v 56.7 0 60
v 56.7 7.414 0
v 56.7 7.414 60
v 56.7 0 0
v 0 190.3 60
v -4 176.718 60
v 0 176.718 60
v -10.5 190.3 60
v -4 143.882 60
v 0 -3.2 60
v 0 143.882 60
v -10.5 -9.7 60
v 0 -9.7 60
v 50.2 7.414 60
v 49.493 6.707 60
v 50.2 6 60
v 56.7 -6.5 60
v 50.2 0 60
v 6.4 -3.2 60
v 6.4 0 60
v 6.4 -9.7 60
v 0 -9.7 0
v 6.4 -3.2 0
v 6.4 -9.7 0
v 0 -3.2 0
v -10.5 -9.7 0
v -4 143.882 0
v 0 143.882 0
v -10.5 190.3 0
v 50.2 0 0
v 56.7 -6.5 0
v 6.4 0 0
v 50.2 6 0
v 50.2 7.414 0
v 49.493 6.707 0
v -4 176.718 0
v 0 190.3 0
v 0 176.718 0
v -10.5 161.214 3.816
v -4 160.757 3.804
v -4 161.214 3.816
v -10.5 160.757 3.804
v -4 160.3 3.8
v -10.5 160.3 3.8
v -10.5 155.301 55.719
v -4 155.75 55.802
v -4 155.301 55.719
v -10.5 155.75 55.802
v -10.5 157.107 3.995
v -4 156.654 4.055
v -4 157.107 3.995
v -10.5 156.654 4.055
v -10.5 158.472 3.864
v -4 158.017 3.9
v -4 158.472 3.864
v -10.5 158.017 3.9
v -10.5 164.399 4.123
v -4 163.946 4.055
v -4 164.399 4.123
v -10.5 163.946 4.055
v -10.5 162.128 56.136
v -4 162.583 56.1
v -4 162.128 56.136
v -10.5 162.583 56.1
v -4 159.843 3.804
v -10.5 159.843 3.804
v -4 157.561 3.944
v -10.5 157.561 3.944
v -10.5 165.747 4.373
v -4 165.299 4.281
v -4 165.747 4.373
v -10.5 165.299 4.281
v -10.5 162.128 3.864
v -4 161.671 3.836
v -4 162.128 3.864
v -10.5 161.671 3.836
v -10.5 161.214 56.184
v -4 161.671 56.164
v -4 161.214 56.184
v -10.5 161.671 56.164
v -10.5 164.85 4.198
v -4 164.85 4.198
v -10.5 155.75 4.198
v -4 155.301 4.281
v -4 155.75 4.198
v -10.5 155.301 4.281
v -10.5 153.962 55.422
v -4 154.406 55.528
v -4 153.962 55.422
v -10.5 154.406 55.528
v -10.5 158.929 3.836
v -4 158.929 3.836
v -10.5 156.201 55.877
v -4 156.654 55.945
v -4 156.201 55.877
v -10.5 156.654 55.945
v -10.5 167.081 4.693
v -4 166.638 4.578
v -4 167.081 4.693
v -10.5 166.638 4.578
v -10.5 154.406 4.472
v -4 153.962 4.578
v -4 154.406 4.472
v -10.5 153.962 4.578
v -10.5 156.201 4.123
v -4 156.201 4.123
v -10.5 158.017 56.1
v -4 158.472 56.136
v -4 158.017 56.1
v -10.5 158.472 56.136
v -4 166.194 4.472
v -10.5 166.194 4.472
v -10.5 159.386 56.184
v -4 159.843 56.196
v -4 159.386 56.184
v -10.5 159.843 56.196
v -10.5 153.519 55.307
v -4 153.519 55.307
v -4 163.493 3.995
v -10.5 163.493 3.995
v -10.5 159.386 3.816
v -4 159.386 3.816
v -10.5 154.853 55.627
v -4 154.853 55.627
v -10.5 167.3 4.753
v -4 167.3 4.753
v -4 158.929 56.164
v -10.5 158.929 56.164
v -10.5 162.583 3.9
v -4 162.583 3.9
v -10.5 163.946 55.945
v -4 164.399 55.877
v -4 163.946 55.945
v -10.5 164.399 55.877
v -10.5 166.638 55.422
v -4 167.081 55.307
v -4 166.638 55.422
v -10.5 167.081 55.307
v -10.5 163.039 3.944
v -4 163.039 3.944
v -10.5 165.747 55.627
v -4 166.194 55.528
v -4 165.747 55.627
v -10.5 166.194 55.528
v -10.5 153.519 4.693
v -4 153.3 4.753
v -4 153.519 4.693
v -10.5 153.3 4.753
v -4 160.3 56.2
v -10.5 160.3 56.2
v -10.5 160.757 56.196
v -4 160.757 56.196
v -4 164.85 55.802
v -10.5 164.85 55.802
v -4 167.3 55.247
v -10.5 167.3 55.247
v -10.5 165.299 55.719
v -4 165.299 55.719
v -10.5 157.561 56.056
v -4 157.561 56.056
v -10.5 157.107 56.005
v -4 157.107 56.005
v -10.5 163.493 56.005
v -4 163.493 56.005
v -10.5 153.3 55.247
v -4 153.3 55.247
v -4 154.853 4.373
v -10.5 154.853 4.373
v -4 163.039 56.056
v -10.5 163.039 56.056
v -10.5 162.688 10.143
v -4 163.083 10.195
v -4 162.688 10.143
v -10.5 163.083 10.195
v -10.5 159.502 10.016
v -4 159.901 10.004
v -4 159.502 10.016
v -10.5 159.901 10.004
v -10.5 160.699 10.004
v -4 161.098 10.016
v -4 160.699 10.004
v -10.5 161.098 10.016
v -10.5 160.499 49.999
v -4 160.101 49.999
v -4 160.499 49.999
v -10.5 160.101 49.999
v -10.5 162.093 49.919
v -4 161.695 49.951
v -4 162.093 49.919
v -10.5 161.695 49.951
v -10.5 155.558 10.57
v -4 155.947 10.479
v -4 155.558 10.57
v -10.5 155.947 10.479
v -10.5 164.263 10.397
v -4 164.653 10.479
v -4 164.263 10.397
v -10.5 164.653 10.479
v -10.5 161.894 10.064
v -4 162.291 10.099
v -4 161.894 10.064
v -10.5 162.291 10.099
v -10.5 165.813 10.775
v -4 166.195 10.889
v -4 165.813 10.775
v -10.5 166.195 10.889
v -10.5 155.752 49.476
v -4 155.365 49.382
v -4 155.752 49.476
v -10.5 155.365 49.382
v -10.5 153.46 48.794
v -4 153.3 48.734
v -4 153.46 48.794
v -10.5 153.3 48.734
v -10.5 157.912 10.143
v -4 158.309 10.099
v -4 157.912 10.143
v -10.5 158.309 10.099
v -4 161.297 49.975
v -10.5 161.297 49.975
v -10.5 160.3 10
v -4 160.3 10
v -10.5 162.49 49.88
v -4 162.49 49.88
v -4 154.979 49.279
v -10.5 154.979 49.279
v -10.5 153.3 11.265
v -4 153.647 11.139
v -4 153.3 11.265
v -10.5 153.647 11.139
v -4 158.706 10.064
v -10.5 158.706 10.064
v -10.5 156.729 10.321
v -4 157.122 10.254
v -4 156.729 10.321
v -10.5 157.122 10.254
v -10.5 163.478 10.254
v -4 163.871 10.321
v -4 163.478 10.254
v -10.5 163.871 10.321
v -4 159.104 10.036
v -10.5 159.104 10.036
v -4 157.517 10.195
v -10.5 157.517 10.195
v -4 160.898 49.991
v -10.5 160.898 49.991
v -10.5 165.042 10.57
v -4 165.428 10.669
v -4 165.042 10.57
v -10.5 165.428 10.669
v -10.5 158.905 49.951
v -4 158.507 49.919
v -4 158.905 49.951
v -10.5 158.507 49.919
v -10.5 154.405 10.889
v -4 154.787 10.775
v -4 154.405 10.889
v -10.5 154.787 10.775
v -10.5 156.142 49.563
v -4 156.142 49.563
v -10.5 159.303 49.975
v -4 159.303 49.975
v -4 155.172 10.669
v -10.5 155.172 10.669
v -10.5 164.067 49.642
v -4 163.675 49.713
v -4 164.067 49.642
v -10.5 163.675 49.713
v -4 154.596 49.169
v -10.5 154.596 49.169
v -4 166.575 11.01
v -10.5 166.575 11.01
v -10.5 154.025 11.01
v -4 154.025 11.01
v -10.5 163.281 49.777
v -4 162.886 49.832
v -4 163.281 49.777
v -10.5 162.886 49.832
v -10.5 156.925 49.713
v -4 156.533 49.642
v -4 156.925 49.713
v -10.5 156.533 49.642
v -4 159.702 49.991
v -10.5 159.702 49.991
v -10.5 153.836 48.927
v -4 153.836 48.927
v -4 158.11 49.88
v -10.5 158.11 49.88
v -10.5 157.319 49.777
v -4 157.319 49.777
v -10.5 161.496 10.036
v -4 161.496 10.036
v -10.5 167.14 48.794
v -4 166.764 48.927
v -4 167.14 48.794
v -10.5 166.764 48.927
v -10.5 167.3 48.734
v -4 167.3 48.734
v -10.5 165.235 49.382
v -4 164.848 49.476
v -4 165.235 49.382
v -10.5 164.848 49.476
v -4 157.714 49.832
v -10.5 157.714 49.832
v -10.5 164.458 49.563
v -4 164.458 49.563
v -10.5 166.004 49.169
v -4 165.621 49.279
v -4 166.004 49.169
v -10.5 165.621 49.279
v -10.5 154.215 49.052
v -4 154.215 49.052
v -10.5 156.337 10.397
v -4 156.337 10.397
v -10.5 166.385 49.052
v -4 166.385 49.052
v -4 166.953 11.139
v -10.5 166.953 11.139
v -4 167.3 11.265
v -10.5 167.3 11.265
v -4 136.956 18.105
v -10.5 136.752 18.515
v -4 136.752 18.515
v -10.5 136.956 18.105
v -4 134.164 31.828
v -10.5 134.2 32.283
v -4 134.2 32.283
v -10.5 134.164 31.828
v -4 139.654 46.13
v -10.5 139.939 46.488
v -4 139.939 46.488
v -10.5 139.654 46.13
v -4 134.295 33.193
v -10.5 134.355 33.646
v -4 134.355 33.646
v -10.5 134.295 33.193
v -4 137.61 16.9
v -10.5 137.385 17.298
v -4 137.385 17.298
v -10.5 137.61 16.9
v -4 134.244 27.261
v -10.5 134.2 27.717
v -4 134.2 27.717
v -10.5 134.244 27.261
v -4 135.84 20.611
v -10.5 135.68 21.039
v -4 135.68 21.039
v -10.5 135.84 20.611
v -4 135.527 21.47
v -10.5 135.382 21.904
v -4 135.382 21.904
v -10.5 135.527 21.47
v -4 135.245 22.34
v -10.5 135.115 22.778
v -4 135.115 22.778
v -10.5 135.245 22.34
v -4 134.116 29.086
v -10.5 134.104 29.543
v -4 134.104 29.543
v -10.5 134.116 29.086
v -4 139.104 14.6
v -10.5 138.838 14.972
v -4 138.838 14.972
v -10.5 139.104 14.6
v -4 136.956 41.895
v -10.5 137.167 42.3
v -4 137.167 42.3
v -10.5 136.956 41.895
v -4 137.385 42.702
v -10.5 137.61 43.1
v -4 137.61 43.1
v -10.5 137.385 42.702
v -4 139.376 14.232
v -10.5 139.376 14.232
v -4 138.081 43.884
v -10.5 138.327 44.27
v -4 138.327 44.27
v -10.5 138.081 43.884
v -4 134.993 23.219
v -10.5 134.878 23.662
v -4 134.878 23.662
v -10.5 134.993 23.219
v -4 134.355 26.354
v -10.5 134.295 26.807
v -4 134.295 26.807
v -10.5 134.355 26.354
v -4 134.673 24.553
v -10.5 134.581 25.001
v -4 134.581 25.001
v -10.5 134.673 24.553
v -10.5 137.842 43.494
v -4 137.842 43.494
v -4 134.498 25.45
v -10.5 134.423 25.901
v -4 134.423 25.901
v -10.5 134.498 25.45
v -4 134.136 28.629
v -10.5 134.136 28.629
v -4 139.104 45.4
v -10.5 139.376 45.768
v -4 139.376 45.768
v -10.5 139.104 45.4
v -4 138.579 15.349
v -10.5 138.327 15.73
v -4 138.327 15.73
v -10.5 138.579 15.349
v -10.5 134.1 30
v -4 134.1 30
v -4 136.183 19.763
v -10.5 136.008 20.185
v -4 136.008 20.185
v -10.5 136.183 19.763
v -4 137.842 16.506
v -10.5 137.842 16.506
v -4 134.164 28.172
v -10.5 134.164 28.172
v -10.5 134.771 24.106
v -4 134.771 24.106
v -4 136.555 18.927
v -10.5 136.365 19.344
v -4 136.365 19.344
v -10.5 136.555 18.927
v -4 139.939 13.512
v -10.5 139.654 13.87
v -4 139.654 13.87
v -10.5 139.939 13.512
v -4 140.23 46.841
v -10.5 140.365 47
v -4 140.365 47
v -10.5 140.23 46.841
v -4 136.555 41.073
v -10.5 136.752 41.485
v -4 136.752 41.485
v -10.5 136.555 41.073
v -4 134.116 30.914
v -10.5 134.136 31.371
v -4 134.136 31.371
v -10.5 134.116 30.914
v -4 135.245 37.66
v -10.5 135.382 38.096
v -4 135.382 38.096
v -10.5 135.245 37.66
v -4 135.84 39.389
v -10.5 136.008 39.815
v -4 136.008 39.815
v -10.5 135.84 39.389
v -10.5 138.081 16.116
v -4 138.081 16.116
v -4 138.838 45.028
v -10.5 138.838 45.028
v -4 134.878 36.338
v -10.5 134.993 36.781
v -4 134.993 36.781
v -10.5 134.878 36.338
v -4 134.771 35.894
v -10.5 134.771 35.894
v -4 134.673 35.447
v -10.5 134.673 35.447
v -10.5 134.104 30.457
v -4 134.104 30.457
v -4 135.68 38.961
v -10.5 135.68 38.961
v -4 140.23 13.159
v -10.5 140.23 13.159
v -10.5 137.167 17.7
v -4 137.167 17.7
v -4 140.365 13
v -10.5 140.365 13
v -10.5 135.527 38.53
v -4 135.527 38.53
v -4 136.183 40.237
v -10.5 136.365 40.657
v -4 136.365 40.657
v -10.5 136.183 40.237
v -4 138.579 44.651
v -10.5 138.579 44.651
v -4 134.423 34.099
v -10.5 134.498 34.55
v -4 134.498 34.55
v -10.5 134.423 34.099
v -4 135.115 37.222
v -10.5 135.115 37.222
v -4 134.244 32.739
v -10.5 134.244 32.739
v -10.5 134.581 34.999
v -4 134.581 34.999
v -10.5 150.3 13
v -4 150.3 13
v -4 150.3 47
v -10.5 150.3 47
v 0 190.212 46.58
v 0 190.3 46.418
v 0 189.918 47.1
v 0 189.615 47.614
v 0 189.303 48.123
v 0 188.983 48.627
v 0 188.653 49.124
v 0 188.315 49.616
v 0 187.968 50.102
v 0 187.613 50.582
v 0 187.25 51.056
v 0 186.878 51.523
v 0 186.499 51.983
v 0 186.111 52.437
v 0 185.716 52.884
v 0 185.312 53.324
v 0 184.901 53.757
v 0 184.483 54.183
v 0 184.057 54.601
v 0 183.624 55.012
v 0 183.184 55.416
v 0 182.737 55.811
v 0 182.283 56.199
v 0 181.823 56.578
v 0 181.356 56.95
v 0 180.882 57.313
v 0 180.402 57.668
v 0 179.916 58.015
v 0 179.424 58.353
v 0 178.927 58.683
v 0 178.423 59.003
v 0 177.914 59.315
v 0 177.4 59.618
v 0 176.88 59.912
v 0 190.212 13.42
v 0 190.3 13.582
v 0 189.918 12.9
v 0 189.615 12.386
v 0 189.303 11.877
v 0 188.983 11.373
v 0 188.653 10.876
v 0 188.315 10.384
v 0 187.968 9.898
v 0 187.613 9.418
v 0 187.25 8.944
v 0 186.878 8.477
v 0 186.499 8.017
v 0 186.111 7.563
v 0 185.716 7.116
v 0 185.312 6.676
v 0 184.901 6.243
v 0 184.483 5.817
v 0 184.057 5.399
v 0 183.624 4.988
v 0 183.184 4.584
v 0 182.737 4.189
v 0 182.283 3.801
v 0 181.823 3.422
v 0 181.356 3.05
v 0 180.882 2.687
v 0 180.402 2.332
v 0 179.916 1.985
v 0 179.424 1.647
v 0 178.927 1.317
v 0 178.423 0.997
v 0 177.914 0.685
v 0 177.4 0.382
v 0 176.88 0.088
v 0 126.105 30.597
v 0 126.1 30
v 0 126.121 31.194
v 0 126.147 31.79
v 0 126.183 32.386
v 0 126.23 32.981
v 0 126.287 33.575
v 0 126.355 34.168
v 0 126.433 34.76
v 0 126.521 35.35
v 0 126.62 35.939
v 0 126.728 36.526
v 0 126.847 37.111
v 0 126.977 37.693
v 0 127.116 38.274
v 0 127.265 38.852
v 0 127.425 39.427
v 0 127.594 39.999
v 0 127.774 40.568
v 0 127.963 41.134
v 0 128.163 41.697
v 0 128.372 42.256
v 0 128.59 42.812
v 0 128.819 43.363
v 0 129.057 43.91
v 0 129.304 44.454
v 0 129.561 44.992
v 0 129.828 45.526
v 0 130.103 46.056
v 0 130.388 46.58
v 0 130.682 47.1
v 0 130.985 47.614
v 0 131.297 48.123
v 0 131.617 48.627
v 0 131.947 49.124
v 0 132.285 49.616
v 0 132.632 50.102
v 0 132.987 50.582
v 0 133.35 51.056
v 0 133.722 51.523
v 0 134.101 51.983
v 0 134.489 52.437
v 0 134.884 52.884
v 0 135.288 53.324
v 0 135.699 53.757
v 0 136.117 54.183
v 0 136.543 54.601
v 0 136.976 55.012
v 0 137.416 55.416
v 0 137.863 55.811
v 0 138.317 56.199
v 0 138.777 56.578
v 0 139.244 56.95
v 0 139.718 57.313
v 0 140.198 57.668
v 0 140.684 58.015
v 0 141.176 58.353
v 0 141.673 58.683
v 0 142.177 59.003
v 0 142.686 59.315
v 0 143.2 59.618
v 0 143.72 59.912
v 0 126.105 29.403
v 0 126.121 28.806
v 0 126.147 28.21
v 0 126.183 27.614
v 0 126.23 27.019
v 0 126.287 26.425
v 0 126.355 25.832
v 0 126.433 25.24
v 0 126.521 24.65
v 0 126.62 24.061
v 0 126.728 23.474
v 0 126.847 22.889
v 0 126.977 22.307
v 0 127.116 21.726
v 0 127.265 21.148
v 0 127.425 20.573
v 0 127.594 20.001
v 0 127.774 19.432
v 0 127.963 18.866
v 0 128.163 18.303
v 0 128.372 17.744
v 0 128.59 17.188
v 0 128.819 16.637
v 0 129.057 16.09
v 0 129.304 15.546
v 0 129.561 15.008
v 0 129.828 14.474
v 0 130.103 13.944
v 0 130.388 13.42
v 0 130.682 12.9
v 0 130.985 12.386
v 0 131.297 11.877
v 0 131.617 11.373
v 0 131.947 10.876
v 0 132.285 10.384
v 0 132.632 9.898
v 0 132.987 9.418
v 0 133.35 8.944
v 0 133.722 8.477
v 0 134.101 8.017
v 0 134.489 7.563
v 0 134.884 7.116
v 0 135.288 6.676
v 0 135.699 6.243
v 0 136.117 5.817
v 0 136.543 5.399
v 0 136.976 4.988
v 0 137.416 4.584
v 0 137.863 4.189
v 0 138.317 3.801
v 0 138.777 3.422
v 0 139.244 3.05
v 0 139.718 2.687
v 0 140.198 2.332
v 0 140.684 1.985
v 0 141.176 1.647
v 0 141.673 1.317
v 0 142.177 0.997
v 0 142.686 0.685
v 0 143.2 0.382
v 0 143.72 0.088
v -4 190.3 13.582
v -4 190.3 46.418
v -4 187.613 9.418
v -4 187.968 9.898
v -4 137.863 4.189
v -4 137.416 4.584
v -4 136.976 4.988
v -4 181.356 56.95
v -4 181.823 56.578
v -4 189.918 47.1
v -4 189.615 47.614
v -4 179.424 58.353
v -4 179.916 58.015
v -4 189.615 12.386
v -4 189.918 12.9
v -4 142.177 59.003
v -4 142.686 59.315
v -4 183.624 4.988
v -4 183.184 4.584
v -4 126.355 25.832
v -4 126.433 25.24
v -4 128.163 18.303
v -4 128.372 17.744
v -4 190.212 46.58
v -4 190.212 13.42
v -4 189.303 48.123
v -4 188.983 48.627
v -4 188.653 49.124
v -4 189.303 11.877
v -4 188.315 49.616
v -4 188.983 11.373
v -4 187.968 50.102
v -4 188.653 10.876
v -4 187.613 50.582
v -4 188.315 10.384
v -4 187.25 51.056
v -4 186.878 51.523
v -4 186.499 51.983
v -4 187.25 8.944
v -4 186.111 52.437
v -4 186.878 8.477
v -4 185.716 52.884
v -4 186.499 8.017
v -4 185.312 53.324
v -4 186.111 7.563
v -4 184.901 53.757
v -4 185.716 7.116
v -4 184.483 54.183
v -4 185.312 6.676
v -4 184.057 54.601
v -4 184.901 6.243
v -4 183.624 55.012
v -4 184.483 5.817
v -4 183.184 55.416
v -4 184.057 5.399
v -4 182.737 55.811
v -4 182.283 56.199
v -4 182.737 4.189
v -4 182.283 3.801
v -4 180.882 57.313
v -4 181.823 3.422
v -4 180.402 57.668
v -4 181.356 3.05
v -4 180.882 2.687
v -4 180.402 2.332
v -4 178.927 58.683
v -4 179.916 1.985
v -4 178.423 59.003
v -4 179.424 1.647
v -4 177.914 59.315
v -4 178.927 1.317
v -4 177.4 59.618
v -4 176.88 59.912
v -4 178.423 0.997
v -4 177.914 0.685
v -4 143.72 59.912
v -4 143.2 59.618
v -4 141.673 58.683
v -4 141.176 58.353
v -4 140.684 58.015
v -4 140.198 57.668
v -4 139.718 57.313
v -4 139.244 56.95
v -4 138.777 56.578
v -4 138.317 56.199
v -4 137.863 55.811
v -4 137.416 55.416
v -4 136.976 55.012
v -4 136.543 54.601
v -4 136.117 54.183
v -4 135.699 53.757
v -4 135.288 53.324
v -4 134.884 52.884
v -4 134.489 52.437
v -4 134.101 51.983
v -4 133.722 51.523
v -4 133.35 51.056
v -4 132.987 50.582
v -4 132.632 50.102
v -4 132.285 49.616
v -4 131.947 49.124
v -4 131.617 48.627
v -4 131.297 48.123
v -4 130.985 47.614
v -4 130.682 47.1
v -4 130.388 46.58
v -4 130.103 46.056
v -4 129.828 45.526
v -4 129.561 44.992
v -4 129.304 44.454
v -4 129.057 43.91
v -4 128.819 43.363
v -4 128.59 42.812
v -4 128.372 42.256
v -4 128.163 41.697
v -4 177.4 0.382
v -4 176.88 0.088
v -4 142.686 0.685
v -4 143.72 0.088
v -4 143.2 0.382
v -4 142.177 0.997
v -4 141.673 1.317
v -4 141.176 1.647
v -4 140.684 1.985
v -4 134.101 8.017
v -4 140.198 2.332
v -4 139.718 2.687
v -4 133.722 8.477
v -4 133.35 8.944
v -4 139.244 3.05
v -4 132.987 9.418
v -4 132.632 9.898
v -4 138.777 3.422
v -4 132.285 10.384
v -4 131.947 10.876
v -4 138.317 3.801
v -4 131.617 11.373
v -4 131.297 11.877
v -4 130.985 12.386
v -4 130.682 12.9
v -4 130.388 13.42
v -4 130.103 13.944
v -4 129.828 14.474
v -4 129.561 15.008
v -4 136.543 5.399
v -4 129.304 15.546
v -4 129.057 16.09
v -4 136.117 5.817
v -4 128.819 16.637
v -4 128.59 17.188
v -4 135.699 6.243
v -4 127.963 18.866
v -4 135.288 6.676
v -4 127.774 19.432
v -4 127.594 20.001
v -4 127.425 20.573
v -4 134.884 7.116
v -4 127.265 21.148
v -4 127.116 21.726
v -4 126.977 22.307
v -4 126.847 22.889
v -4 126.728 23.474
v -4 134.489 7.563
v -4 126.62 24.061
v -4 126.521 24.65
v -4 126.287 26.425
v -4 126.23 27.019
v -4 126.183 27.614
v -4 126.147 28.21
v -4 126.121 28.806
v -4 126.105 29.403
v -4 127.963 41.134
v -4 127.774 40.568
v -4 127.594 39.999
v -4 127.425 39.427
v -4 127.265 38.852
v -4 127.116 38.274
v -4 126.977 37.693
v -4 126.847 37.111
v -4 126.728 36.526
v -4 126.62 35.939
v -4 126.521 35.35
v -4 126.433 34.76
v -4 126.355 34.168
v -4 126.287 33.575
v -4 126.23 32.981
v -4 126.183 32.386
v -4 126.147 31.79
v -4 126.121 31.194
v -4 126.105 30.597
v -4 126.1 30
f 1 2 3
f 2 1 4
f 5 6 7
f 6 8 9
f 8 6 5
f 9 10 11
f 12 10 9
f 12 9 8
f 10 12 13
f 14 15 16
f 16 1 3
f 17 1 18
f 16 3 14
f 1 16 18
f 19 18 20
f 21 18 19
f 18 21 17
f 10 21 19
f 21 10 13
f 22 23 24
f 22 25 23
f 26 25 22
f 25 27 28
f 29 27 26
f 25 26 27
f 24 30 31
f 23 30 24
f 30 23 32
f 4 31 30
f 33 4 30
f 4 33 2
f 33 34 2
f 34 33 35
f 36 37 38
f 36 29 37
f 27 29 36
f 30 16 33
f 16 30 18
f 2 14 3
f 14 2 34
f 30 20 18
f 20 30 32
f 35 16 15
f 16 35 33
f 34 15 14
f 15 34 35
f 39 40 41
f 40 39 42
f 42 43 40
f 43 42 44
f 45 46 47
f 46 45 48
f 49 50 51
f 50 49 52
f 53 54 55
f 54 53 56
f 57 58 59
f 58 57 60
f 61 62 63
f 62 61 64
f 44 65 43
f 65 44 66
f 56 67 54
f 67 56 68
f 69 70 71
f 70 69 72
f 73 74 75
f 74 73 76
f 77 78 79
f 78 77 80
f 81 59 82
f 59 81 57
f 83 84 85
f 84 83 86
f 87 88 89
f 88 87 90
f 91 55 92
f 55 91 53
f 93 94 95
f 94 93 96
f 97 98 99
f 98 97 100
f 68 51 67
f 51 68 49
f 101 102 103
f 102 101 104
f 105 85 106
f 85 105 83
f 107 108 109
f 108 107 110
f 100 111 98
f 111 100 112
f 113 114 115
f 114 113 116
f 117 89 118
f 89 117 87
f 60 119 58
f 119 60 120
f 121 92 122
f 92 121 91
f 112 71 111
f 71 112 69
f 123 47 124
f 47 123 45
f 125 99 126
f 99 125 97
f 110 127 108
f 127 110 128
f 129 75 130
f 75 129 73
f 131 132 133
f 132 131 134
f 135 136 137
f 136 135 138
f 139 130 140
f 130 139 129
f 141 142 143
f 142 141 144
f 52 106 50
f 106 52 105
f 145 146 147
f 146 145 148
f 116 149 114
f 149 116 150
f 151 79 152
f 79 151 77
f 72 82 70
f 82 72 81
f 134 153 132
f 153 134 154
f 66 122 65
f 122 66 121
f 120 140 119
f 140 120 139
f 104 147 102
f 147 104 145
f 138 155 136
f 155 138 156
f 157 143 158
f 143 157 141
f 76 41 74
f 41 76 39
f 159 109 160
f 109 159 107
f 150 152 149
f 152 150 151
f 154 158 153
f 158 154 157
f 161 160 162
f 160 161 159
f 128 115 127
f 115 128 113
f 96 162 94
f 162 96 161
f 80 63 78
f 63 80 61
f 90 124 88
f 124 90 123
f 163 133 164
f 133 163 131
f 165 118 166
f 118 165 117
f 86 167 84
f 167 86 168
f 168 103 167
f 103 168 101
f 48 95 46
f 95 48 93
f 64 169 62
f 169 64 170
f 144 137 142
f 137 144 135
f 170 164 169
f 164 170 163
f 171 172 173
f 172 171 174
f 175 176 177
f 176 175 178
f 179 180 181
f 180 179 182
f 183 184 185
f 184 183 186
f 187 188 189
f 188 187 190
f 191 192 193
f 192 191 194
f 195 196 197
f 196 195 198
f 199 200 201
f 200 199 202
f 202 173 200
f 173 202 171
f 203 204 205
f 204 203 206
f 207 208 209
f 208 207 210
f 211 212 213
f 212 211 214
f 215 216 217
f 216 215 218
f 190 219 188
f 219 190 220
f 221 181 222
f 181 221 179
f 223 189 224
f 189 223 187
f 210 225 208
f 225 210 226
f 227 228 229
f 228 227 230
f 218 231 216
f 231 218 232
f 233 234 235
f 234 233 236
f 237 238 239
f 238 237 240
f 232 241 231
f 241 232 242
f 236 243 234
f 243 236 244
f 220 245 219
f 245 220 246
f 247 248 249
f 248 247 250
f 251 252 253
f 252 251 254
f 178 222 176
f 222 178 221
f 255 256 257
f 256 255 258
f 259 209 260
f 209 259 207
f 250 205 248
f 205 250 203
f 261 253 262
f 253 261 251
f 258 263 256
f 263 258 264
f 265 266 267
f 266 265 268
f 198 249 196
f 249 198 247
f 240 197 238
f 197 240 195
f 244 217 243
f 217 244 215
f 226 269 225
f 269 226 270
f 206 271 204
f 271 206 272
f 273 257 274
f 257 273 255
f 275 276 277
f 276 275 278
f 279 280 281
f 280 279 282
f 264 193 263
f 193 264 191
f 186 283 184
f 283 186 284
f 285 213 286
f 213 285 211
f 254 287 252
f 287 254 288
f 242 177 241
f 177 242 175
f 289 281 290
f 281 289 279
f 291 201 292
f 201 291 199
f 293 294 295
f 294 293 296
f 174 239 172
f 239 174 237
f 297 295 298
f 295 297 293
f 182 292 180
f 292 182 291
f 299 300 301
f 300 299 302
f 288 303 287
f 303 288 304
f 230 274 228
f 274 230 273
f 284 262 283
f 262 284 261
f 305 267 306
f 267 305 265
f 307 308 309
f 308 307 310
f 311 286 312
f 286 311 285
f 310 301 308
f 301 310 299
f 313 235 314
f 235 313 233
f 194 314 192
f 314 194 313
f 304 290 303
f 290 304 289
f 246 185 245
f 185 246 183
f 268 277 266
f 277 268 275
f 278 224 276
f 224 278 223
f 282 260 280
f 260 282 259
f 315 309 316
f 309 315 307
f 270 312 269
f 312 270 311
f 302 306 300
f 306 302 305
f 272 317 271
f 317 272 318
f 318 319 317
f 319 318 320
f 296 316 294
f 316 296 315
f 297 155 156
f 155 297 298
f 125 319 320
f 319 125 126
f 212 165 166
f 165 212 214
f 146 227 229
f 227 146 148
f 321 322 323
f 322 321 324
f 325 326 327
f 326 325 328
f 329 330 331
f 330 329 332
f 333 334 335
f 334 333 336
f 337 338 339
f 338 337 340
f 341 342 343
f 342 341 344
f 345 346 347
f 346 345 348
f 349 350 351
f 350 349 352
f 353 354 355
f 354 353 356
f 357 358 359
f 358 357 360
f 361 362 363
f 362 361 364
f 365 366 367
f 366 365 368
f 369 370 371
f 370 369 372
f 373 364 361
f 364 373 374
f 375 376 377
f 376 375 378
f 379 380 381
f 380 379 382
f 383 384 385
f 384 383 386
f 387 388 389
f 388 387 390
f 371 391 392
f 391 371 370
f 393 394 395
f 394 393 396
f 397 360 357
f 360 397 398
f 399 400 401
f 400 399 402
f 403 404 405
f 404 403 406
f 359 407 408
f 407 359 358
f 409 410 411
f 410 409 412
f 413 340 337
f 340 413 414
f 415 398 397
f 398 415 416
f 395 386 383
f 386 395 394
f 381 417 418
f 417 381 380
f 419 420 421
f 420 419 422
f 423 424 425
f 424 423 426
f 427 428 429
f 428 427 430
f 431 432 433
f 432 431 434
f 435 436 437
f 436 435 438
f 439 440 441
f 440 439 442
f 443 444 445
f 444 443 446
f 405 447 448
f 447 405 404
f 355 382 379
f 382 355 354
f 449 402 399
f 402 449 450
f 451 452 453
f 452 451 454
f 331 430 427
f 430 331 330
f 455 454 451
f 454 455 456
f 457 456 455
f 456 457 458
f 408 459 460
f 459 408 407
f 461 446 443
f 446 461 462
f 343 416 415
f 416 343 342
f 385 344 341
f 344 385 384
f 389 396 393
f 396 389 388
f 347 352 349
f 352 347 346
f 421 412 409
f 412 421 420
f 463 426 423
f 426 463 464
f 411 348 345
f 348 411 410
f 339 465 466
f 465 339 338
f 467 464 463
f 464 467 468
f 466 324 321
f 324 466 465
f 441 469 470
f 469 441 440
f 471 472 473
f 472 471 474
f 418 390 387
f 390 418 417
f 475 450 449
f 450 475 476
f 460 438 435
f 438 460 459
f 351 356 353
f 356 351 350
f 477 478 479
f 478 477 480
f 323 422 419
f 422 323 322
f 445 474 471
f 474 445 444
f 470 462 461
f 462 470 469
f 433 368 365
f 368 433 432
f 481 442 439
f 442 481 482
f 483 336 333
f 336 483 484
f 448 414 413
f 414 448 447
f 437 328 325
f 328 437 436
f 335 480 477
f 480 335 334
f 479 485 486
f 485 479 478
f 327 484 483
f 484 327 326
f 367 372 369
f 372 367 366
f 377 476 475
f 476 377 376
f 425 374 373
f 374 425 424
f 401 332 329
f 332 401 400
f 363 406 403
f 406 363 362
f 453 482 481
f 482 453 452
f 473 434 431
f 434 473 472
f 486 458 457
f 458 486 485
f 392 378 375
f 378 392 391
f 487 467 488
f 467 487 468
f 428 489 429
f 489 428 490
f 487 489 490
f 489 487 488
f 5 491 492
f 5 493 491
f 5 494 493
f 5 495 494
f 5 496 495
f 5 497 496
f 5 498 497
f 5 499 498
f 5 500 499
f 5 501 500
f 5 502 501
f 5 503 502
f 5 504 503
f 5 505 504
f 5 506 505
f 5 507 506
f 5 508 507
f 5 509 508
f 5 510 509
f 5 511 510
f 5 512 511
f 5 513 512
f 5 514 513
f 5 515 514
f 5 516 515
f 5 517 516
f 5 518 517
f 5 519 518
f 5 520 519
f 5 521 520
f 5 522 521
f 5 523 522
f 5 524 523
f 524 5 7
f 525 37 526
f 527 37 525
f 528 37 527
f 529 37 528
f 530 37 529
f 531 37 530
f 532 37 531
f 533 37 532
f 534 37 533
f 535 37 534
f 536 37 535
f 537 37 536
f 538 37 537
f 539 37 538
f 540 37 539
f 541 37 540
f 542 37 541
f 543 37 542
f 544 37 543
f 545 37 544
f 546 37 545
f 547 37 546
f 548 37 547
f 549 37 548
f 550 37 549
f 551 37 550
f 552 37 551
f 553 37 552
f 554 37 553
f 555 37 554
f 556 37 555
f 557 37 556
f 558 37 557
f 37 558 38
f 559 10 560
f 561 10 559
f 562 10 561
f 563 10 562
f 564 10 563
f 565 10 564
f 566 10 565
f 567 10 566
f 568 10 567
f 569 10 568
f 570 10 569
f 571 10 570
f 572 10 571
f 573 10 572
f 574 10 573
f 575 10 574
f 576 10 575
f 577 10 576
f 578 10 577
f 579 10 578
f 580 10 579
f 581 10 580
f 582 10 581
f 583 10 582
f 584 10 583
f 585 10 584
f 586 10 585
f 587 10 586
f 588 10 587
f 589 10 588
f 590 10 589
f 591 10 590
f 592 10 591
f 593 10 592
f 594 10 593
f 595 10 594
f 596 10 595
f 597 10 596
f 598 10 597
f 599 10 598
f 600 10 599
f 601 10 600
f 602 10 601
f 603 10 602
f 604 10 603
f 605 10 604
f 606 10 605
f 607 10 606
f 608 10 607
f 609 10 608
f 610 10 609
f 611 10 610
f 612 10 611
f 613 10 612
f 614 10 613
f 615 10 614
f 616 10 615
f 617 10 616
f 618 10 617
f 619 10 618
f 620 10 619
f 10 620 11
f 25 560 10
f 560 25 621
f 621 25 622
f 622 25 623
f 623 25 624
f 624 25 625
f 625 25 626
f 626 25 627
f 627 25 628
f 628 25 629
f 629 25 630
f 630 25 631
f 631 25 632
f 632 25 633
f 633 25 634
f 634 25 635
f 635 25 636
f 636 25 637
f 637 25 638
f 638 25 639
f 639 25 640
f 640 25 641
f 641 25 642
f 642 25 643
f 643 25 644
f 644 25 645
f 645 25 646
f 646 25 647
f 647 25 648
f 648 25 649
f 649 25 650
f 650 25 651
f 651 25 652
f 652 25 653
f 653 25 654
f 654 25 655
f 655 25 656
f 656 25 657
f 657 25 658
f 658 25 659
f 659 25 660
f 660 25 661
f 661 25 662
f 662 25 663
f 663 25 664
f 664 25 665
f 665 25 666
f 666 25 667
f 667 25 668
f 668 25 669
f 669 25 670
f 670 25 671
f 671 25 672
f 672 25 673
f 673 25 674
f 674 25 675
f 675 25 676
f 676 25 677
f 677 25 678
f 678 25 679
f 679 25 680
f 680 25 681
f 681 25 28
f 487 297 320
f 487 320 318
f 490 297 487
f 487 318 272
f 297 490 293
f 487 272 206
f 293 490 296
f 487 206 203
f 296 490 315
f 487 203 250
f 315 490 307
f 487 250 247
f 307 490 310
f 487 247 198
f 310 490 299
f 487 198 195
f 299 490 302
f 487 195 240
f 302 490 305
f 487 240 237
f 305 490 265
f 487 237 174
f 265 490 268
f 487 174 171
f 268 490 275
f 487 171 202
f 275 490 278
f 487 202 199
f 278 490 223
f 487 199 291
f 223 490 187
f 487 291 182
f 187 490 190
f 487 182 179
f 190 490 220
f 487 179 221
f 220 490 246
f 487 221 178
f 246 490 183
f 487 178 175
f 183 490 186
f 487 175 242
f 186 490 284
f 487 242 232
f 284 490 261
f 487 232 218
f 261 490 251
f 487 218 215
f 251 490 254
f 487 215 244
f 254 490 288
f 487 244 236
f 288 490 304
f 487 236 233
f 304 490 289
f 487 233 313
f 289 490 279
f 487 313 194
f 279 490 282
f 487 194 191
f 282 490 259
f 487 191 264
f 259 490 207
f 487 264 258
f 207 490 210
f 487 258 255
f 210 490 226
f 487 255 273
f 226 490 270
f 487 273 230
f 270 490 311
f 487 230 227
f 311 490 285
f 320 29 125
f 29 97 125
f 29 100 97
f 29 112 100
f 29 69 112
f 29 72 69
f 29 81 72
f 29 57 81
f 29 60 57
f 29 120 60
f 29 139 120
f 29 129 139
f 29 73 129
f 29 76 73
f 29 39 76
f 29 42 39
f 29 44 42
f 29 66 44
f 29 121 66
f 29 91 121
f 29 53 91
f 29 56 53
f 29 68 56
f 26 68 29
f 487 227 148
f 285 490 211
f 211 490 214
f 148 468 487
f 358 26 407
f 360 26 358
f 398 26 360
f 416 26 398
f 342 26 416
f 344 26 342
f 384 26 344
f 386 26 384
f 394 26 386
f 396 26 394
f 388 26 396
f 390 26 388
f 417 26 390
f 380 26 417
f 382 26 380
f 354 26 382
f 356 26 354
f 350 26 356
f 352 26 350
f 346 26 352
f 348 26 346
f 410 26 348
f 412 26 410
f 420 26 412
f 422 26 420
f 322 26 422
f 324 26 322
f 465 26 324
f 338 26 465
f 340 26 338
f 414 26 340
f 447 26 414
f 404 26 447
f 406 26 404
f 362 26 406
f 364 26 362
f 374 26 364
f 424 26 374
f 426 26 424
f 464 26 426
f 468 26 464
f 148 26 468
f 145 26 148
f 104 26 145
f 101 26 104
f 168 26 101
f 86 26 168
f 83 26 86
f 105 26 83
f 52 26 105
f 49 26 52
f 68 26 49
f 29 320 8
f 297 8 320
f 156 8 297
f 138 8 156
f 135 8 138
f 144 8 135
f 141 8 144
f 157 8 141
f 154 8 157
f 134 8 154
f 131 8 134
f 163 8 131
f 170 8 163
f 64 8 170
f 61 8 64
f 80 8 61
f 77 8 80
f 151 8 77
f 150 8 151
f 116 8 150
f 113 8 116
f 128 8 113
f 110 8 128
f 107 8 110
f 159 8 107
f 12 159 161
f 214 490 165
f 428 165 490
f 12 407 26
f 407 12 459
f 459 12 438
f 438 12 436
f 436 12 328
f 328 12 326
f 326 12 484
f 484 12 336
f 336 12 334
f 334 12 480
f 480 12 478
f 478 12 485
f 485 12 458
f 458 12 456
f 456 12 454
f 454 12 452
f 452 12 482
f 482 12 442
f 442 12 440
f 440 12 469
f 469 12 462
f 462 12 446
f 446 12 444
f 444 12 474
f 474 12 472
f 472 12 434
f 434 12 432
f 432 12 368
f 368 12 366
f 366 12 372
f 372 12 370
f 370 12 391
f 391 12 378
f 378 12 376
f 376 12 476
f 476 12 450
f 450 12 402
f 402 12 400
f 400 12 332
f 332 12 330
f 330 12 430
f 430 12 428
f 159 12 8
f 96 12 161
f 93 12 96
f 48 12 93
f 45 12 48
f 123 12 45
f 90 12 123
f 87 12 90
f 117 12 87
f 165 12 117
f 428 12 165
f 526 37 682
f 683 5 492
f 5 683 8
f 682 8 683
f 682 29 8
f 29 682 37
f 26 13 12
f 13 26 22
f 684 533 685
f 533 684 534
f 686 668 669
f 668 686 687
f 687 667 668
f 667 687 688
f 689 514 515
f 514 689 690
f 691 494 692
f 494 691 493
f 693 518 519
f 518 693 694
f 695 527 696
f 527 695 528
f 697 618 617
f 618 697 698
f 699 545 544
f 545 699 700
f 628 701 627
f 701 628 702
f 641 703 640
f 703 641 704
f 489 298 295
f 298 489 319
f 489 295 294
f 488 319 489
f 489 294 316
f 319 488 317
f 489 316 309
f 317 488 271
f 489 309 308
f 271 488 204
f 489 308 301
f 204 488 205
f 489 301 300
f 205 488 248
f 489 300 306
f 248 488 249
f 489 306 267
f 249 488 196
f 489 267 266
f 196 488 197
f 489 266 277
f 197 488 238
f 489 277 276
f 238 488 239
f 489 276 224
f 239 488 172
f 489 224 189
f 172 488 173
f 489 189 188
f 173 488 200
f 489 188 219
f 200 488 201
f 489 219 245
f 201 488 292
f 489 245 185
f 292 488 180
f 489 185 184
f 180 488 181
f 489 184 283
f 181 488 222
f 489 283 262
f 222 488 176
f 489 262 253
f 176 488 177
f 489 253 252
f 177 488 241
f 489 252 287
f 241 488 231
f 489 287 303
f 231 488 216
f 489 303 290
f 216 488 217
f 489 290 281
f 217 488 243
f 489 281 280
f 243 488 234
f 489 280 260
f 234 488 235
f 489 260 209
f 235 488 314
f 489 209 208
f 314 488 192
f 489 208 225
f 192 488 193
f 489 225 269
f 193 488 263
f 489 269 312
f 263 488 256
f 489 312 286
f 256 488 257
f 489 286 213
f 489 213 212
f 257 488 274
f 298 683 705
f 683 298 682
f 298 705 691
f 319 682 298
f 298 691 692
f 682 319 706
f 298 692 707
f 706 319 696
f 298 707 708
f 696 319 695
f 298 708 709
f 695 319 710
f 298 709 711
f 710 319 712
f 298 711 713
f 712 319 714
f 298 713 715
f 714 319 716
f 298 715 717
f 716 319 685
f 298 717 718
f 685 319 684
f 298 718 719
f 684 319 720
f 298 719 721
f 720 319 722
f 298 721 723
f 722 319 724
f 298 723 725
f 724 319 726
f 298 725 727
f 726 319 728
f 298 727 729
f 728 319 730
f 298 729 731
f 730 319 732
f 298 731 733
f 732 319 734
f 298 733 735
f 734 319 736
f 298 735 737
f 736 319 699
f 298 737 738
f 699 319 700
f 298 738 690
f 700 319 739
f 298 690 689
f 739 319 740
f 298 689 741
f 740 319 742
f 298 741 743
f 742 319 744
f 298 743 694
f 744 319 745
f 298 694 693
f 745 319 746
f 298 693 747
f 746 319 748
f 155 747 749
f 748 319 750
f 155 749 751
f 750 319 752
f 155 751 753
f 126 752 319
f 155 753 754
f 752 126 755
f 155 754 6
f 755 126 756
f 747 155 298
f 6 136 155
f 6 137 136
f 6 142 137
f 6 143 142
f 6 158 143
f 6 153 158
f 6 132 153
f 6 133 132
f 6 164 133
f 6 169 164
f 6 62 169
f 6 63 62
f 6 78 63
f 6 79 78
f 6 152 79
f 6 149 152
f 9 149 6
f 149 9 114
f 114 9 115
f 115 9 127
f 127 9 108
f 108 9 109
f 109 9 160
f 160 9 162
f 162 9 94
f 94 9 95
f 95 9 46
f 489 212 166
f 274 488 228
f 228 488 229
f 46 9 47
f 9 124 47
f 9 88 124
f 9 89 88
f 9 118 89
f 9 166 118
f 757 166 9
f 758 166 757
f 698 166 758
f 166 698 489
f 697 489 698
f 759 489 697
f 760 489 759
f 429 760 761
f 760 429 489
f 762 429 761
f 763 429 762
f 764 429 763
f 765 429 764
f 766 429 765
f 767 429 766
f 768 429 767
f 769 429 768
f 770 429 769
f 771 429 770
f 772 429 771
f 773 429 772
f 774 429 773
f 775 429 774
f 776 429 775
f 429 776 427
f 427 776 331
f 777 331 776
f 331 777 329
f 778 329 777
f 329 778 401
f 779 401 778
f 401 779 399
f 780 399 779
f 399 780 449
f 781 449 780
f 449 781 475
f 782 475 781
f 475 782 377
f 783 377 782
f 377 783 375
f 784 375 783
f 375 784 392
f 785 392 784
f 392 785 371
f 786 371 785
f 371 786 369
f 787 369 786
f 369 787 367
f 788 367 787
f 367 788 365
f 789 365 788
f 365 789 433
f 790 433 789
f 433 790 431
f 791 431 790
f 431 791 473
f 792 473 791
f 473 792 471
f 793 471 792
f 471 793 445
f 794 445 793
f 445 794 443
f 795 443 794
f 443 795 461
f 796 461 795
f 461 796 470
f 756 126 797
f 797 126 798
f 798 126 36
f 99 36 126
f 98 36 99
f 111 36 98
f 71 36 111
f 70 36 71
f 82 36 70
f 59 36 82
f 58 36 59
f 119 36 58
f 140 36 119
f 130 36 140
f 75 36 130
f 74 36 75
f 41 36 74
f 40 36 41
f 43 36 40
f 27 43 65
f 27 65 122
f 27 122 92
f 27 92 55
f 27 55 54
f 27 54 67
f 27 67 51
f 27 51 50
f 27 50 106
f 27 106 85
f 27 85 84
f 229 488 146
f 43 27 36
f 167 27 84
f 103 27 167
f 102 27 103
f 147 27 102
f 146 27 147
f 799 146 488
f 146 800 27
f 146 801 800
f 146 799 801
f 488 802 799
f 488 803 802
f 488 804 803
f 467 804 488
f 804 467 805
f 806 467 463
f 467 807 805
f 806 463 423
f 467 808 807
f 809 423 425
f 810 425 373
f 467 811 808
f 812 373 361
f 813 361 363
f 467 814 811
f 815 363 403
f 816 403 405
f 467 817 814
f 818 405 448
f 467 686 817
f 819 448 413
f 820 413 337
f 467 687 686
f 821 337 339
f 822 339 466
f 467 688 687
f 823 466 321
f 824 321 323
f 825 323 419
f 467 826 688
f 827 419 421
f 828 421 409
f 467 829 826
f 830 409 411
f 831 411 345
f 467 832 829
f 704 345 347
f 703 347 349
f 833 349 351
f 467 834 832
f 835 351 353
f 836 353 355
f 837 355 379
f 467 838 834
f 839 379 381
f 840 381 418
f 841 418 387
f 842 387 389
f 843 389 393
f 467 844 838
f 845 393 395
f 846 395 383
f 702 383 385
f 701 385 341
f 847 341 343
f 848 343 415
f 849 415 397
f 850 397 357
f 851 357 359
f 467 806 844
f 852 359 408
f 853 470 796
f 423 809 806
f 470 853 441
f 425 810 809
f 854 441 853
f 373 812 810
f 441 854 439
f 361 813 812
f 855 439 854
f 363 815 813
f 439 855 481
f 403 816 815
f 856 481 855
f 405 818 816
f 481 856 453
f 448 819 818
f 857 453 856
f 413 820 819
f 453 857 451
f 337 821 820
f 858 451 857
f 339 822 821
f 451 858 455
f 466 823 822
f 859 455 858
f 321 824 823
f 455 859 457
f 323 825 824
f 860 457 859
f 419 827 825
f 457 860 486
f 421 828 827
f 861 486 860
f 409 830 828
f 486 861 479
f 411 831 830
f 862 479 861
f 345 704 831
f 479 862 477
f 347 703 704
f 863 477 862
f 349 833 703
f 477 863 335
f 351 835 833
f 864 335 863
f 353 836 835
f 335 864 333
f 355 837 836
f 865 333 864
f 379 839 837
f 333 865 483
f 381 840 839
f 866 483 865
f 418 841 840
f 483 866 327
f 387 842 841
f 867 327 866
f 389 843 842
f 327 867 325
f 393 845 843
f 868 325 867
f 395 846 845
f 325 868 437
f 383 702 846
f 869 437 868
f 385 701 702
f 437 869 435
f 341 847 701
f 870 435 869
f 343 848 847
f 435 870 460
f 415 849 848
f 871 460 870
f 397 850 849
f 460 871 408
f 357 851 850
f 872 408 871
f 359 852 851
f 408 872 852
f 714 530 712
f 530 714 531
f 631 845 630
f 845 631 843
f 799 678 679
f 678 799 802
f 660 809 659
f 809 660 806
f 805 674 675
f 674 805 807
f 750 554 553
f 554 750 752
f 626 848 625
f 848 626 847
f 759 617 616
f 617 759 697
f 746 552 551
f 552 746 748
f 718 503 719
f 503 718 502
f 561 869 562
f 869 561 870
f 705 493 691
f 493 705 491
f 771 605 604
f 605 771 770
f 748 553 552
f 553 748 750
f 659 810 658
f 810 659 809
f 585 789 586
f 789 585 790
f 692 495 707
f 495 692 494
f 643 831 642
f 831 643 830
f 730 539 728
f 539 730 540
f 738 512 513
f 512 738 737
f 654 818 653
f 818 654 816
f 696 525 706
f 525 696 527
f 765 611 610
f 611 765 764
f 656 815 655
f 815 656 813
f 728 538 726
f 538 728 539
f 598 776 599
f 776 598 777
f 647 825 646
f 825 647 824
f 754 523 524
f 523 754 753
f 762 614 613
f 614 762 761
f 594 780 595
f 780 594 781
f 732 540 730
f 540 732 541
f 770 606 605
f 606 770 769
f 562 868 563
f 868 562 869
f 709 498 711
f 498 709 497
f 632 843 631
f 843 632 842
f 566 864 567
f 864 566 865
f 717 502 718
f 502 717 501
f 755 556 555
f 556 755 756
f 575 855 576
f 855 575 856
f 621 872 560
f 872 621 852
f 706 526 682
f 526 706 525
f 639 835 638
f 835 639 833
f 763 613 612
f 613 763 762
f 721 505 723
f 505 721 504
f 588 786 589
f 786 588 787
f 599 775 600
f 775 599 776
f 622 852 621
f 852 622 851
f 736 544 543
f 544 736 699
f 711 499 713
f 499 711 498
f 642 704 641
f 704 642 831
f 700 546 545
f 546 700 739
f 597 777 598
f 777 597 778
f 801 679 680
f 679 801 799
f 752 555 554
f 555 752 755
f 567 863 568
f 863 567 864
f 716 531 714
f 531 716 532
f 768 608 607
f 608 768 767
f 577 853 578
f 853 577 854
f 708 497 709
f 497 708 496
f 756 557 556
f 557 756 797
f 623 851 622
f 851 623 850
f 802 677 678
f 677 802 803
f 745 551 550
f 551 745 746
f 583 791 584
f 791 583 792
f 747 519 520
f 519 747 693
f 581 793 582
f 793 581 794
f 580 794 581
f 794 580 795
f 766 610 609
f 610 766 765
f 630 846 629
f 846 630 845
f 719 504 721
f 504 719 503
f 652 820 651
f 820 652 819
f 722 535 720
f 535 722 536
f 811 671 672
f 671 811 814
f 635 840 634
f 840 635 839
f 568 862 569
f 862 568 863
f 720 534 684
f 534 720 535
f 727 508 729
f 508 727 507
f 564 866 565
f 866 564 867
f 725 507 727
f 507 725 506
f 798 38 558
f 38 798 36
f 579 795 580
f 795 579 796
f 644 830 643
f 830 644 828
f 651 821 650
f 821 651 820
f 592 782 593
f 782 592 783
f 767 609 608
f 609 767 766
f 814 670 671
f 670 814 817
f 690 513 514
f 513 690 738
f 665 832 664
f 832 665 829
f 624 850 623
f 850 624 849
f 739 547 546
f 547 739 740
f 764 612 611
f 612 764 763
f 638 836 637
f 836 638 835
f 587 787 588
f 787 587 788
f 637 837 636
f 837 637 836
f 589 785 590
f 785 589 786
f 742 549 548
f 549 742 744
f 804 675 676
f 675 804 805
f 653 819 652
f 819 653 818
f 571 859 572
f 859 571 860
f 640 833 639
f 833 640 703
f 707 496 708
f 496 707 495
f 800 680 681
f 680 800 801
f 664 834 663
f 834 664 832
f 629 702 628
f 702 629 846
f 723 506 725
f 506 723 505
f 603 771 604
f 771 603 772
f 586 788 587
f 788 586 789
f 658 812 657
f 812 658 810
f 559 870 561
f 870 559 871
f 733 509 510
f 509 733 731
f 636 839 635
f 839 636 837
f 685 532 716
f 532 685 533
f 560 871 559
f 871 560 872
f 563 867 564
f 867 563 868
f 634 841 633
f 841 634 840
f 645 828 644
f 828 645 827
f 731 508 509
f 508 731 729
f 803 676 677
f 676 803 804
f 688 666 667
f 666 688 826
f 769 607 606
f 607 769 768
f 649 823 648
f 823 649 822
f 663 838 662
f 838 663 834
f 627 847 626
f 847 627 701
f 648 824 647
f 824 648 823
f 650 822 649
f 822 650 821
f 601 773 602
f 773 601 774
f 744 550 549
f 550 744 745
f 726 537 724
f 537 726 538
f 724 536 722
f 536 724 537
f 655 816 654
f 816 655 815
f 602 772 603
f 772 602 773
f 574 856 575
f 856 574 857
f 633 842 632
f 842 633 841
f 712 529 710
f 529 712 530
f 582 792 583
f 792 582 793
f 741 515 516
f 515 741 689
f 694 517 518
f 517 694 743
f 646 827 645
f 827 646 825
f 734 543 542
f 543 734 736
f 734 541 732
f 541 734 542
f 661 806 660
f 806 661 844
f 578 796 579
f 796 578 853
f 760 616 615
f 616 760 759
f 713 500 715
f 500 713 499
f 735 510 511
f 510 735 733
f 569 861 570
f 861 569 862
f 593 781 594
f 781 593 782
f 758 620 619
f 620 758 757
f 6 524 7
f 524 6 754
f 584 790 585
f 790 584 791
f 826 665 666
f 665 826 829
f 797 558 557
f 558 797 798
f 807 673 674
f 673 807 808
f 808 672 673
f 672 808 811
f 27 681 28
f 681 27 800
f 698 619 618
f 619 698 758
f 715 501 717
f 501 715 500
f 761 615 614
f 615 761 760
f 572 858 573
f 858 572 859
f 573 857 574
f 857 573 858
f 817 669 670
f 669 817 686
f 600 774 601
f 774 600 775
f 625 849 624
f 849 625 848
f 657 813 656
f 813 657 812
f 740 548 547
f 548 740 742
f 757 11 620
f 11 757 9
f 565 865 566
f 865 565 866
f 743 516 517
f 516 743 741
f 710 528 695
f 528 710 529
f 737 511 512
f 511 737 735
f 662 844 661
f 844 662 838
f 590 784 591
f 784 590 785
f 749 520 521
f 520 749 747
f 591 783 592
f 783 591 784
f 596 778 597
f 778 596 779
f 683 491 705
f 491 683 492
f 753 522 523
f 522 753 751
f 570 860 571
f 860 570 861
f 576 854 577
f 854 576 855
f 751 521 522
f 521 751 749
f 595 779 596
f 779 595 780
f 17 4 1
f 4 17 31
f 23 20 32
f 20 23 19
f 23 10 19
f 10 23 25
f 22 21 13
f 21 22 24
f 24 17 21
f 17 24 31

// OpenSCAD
//Spool holder holder for the UM3.

//Measurements.
total_width = 49.8;
plate_width = 6;
lip_height = 3.2;
gaps_radius = 52 / 2;
gaps_hor_height = 14;
gaps_hor_width = 6;
gaps_ver_height = 16;
gaps_ver_width = 34;
clips_gap = 4;
clips_extend = 8;
thickness = 6.5;

//Settings.
lip_size = 1;
print_play = 0.2;
width = 60;
backplate_height = 200;
$fs = 0.4;
$fa = 1;

//Top side.
translate([plate_width + print_play * 2, -thickness, 0]) {
	cube([total_width - plate_width + thickness, thickness, width]);
}
translate([0, -lip_height - thickness, 0]) {
	hull() {
		cube([plate_width + print_play * 2, thickness, width]);
		translate([0, lip_height, 0]) {
			cube([total_width + print_play * 2 + thickness, thickness - lip_height, width]);
		}
	}
}
//Lip to prevent sliding.
translate([total_width + print_play * 2, 0, 0]) {
	cube([thickness, plate_width + lip_size * sqrt(2), width]);
	translate([0, plate_width, 0]) {
		rotate([0, 0, 45]) {
			cube([lip_size, lip_size, width]);
		}
	}
}

//Backplate.
translate([-thickness - clips_gap, -lip_height - thickness, 0]) {
	difference() {
		cube([thickness + clips_gap, backplate_height, width]);
		translate([thickness, backplate_height - width / 2, width / 2]) {
			rotate([0, 90, 0]) {
				cylinder(r=gaps_radius + clips_extend + print_play, h=clips_gap + 1);
			}
		}
		translate([-1, backplate_height - width / 2, width / 2]) {
			rotate([0, 90, 0]) {
				intersection() {
					difference() {
						cylinder(r=gaps_radius + print_play, h=thickness + 2);
						cylinder(r=gaps_radius - gaps_hor_width, h=thickness + 2);
					}
					translate([-gaps_radius - print_play, -gaps_hor_height / 2, 0]) {
						cube([(gaps_radius + print_play) * 2, gaps_hor_height, thickness + 2]);
					}
				}
				intersection() {
					cylinder(r=gaps_radius + print_play, h=thickness + 2);
					translate([-gaps_ver_width / 2, -gaps_radius - print_play, 0]) {
						cube([gaps_ver_width, gaps_ver_height + print_play, thickness + 2]);
					}
				}
			}
		}
	}
}
